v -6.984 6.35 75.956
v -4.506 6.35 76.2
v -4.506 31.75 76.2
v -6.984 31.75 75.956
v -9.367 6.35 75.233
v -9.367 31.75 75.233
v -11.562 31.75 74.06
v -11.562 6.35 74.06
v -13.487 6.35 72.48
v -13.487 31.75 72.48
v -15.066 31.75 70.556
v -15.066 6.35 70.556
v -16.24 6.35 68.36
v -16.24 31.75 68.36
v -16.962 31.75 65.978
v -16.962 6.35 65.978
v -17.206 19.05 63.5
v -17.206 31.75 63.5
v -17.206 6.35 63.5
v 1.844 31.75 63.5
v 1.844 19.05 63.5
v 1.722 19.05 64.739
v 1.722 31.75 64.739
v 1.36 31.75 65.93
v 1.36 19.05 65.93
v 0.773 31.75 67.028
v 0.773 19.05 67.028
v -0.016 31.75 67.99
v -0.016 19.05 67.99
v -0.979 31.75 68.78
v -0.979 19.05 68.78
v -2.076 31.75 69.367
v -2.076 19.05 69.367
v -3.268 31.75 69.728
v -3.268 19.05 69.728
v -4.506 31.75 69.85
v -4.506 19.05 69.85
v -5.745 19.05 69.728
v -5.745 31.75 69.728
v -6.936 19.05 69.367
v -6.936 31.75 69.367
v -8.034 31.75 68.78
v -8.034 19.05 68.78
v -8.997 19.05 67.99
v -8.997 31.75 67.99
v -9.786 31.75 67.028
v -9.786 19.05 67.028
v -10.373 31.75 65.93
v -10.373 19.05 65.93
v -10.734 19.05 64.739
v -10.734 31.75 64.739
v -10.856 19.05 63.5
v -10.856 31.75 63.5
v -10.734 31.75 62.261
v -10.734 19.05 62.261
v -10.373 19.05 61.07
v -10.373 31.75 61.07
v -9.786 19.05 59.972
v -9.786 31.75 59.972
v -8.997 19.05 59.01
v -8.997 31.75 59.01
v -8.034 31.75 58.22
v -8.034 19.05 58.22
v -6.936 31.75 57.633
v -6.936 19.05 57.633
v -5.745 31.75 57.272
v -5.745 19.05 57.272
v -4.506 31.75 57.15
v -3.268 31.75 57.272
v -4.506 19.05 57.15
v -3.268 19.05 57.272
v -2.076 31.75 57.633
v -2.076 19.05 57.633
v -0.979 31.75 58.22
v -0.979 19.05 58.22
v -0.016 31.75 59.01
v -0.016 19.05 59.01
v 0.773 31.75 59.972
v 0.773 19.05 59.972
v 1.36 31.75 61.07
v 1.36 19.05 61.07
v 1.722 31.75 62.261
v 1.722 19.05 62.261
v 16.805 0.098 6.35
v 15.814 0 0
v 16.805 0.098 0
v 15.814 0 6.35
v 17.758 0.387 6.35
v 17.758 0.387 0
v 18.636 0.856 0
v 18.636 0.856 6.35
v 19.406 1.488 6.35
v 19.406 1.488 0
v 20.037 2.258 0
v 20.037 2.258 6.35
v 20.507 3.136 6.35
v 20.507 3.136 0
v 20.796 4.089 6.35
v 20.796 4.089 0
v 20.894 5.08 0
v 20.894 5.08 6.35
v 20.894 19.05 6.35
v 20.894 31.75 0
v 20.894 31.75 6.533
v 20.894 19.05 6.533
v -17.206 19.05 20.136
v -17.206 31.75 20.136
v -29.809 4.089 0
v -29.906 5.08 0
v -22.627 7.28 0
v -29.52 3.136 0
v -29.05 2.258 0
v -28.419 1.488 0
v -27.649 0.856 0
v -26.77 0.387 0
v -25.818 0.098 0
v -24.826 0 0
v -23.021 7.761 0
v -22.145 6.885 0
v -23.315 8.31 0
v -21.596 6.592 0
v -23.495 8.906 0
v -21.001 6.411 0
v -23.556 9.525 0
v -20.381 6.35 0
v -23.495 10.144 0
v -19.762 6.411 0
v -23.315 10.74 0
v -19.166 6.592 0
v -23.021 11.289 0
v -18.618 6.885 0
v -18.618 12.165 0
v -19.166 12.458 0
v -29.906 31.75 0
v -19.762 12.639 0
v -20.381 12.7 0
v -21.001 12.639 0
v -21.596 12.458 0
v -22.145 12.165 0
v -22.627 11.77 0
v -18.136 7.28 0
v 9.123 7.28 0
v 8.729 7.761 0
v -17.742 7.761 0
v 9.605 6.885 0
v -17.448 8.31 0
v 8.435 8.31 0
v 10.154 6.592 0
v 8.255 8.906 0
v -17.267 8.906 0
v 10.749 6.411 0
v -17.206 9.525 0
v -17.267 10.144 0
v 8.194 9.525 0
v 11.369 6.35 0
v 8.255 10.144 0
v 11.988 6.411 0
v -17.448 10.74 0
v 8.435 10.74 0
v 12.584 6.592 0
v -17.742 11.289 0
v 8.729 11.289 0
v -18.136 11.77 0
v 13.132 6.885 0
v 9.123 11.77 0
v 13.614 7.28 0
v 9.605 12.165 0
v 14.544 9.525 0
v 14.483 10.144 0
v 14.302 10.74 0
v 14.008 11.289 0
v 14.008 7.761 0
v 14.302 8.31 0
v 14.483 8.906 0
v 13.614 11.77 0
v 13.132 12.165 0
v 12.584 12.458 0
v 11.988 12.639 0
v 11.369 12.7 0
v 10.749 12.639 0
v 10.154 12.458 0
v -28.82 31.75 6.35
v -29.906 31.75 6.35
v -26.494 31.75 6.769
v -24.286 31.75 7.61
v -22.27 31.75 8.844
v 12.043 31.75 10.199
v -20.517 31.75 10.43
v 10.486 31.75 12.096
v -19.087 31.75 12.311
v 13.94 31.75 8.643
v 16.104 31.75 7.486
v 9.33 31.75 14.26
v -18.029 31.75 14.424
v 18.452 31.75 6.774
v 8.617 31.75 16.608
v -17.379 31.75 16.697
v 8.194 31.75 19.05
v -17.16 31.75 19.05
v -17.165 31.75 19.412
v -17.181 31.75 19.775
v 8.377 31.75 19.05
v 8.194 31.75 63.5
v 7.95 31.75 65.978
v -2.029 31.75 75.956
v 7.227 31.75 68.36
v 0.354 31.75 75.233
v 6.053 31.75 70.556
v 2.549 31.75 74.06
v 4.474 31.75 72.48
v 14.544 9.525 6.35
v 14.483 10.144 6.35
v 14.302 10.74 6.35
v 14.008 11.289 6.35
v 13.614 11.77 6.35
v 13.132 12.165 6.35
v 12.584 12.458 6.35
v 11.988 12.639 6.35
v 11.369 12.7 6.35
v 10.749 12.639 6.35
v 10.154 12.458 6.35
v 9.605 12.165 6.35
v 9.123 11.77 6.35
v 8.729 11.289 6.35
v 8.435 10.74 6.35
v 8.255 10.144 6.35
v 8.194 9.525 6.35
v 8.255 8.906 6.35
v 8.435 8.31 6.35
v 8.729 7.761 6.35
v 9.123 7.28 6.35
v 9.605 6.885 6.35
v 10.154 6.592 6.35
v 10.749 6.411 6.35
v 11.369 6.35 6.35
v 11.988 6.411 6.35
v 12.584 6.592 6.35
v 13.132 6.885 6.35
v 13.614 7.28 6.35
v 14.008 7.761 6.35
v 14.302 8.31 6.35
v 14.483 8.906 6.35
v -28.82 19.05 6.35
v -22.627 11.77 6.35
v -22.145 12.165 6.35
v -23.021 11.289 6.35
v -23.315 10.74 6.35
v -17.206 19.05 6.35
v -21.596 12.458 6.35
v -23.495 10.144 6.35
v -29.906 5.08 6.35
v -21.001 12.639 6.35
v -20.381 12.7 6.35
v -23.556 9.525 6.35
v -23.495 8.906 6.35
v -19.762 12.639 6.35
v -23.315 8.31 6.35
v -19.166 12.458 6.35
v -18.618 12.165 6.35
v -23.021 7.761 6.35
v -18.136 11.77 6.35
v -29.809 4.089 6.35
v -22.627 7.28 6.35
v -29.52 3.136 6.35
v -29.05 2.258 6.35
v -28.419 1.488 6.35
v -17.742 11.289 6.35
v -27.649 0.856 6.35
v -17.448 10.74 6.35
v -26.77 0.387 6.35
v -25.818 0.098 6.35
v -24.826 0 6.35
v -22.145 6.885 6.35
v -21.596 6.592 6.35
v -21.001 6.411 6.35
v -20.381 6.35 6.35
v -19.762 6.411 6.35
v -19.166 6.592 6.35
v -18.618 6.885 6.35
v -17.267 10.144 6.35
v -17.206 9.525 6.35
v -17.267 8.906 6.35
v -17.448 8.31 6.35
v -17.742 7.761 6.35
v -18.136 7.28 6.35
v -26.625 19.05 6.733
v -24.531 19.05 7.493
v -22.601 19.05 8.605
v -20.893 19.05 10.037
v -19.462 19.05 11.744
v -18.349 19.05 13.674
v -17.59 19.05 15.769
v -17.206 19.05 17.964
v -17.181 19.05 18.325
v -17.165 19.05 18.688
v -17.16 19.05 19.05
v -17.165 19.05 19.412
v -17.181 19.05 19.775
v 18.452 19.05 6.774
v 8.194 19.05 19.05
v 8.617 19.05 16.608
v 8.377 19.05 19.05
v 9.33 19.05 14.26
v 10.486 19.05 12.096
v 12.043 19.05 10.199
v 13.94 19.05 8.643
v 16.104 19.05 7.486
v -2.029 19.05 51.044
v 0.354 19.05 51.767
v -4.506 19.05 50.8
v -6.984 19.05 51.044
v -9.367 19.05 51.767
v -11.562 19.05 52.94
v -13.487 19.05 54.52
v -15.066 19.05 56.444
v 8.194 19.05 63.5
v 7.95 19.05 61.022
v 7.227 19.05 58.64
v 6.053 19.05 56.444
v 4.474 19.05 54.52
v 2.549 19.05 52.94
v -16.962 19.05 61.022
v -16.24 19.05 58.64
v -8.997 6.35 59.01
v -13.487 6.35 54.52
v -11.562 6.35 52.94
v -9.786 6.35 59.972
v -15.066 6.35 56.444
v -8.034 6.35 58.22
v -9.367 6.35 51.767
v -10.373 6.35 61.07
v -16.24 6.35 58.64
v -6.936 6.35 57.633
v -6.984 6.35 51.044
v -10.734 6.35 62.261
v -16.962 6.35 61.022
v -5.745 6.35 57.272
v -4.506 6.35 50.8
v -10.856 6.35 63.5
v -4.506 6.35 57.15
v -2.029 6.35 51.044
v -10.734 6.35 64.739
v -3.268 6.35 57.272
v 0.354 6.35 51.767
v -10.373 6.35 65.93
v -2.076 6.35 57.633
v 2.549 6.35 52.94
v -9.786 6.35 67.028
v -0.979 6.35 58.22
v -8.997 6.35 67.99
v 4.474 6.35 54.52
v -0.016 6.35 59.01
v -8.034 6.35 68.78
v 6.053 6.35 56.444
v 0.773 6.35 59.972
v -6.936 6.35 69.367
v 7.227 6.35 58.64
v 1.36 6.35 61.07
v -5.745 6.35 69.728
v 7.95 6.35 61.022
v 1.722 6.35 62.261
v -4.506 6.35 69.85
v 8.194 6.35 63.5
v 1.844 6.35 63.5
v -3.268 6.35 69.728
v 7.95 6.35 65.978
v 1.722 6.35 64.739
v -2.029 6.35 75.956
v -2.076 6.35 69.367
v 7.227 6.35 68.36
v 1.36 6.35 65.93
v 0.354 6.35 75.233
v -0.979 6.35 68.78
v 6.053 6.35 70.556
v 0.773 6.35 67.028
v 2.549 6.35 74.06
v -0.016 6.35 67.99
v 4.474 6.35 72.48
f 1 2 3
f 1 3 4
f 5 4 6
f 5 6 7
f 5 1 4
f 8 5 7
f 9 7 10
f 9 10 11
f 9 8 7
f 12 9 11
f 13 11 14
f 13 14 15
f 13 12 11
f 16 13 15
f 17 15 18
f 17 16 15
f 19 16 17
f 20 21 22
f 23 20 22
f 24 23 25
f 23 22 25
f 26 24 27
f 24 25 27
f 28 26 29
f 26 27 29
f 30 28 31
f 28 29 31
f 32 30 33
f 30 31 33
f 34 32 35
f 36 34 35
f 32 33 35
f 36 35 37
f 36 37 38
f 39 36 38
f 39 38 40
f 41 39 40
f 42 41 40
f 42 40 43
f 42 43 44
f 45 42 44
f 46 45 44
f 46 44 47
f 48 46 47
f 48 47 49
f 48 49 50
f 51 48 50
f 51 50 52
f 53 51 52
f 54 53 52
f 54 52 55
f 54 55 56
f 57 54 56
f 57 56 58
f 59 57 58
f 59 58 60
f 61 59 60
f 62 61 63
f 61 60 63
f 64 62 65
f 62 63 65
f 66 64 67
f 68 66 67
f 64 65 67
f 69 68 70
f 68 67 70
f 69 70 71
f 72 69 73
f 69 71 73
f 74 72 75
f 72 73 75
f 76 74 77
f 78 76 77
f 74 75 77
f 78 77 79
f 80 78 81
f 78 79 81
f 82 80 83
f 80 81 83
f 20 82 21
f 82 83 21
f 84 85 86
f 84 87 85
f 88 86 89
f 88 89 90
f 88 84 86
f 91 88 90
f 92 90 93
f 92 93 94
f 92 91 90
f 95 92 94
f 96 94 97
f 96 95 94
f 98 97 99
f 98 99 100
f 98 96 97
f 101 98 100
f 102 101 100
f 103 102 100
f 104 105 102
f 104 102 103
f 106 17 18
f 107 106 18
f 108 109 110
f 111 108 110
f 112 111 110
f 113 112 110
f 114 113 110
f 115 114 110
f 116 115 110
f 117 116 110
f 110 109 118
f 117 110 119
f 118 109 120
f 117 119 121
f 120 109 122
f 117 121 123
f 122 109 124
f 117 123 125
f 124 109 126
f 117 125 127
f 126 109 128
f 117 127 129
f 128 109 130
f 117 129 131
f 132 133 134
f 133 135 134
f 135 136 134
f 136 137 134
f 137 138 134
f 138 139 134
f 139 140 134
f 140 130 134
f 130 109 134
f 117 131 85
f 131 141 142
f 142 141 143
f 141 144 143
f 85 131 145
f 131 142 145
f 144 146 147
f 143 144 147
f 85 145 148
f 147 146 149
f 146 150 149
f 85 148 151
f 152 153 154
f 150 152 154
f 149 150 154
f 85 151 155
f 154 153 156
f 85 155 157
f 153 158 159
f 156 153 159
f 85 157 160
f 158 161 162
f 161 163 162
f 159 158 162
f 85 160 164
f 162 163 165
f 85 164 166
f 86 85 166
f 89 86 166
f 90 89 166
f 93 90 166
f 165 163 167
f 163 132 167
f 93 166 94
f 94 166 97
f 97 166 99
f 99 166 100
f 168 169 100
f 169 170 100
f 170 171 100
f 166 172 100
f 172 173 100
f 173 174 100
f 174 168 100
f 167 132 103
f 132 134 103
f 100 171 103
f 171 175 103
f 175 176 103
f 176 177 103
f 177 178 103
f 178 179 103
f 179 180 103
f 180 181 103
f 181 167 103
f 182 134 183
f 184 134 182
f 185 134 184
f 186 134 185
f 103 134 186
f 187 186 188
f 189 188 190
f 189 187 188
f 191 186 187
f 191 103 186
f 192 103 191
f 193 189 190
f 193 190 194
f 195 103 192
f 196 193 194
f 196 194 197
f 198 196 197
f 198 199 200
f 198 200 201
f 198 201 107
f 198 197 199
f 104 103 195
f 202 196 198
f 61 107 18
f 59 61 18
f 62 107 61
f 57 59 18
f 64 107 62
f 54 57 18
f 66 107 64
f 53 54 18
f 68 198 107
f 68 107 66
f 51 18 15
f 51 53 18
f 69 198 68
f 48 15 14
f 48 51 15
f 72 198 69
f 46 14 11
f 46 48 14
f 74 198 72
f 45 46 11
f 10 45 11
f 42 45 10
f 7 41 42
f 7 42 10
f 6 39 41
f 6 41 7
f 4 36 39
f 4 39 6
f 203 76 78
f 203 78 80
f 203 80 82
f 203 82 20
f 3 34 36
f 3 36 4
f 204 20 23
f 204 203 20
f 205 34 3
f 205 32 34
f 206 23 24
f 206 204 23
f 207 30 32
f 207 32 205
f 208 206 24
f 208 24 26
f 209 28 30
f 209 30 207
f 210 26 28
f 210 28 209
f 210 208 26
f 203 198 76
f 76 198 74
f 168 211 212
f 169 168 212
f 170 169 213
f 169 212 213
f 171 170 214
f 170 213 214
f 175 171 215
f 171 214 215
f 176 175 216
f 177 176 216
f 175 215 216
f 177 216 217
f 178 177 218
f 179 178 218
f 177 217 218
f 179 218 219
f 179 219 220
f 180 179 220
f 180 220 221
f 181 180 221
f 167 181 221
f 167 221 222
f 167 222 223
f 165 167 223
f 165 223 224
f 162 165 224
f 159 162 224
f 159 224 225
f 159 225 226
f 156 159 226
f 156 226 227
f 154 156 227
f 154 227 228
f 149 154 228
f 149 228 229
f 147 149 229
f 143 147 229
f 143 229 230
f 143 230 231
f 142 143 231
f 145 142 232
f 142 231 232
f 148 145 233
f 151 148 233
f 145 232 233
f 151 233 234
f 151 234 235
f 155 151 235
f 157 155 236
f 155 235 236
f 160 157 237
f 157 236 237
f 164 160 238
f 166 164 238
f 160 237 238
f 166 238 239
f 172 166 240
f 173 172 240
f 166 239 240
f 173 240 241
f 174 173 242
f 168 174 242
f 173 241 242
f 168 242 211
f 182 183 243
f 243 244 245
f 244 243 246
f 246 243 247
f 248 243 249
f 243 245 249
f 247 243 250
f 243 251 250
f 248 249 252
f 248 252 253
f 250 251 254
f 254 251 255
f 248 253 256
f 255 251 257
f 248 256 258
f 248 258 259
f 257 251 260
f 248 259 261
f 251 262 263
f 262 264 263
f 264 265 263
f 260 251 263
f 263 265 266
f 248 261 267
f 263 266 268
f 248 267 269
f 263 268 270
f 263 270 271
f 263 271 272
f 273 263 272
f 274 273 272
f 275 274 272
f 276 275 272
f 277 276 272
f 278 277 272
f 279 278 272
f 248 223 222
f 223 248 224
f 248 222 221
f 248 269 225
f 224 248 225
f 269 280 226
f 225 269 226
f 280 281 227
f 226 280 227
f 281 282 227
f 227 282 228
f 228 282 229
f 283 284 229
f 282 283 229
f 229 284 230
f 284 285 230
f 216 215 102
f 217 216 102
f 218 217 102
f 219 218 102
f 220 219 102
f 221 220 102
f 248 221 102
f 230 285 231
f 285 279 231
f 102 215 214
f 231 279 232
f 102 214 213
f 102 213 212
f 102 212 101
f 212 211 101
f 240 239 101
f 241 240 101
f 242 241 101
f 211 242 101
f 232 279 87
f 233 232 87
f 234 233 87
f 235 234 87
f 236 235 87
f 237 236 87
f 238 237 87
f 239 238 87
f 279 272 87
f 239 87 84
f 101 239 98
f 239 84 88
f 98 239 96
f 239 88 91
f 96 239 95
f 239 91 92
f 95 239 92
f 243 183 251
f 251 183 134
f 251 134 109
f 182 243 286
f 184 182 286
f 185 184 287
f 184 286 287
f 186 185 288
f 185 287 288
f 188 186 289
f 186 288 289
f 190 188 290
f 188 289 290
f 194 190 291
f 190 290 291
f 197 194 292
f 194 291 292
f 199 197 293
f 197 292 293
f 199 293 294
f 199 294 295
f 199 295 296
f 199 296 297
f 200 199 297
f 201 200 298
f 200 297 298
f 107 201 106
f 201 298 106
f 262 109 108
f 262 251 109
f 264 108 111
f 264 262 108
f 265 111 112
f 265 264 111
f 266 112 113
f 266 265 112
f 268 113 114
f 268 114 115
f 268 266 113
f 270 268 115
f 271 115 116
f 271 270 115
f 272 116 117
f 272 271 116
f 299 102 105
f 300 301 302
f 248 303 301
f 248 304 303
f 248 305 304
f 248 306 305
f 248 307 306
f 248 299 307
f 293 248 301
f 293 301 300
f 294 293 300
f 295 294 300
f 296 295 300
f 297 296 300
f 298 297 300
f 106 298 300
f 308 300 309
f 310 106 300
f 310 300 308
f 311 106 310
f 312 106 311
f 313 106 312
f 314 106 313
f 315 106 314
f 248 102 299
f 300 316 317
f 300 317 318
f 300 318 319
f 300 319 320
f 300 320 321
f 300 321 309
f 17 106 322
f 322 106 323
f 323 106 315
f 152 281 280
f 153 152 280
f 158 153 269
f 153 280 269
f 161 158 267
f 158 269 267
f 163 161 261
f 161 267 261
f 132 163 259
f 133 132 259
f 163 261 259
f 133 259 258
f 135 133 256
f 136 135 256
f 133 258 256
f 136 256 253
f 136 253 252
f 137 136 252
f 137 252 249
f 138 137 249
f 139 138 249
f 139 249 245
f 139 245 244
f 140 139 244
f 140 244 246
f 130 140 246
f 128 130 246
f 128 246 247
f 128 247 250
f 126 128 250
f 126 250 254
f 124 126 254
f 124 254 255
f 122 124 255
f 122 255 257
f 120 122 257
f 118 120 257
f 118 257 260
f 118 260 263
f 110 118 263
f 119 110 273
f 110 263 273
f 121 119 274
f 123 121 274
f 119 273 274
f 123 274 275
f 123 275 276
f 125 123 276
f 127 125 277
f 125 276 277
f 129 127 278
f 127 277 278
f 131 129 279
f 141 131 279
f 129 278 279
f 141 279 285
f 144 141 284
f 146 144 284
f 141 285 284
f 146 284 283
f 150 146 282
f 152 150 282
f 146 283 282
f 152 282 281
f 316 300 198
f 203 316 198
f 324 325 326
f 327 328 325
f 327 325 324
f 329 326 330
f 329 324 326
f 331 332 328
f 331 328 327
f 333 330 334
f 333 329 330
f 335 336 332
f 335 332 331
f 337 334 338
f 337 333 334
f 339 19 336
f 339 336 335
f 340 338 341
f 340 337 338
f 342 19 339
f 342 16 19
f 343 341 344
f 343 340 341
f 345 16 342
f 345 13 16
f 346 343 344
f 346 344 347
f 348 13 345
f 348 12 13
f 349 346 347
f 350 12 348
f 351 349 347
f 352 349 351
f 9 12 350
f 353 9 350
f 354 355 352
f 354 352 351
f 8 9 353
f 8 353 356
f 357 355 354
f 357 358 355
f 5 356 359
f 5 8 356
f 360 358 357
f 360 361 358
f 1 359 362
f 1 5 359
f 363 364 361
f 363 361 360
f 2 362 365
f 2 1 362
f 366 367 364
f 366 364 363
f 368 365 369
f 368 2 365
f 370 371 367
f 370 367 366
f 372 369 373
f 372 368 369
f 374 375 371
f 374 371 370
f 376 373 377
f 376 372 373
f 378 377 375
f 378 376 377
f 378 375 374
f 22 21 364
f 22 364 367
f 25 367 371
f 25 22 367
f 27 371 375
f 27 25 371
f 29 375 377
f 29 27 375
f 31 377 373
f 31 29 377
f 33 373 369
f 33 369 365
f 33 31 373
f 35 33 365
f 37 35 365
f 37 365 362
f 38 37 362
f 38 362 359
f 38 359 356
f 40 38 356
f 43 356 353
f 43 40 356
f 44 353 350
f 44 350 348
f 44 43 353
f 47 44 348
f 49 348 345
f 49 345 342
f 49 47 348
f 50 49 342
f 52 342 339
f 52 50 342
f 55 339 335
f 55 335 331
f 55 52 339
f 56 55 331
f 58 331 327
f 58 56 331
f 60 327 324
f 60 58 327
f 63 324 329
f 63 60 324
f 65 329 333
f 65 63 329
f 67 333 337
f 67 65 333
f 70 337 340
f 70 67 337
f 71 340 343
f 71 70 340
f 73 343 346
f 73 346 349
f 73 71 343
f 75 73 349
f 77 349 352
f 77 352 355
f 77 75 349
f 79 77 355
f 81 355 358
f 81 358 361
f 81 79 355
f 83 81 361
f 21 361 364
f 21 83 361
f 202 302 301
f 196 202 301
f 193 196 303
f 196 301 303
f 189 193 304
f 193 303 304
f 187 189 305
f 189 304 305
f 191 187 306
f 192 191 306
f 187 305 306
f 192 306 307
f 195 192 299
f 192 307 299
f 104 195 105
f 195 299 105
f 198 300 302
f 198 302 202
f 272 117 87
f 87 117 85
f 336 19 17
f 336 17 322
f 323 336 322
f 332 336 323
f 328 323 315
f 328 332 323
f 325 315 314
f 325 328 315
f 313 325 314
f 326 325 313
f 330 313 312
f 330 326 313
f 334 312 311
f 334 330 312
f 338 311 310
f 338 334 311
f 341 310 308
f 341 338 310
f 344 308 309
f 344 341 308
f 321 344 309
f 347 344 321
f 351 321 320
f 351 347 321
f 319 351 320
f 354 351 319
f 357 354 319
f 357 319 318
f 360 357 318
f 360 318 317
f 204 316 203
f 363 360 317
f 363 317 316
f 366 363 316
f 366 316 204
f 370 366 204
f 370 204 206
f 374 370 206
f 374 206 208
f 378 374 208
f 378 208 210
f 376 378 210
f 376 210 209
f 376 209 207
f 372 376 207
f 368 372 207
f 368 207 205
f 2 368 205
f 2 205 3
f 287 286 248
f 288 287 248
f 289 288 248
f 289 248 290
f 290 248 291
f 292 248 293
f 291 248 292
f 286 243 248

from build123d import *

# Parameters (mm, degrees)
F0_W      = 50.8
F0_H      = 31.75
F1_DEPTH  = 6.35
F2_R      = 3.175
F3_DEPTH  = 25.4
F4_R      = 5.08
F5_W      = 25.4
F5_H      = 12.7
F6_DEPTH  = 69.85
F7_R      = 6.35
F8_DEPTH  = 12.7
F9_DEPTH  = 25.4
F10_W     = 12.7
F10_H     = 12.7
F11_DEPTH = 12.7
F13_DEPTH = 25.4
F14_W     = 12.7
F14_H     = 12.7
F15_DEPTH = 12.7
F17_DEPTH = 25.4


with BuildPart() as f1:
    # F0 (on Top) → F1 (new body)
    with BuildSketch(Plane.XY):
        with Locations((-4.5064515435, 15.875)):
            Rectangle(F0_W, F0_H)
    extrude(amount=F1_DEPTH)

    # F2 (on face) → F3 (cut)
    with BuildSketch(Plane.XY.offset(6.35)):
        with Locations((11.3685484565, 9.525)):
            Circle(F2_R)
        with Locations((-20.3814515435, 9.525)):
            Circle(F2_R)
    extrude(amount=-F3_DEPTH, mode=Mode.SUBTRACT)

    # F4
    f4_edges = [f1.edges().sort_by_distance(p)[0] for p in [
        (20.893548, 0, 3.175),
        (-29.906452, 0, 3.175),
    ]]
    fillet(f4_edges, radius=F4_R)

    # F5 (on face) → F6 (join)
    with BuildSketch(Plane.XY.offset(6.35)):
        with Locations((-4.5064515435, 25.4)):
            Rectangle(F5_W, F5_H)
    extrude(amount=F6_DEPTH)

    # F7 (on face) → F8 (join)
    with BuildSketch(Plane.XZ.offset(-19.05)):
        with BuildLine():
            ThreePointArc((-17.2064515435, 63.5), (-4.5064515435, 50.8), (8.1935484565, 63.5))
            ThreePointArc((8.1935484565, 63.5), (4.473804616, 72.4802560826), (-4.5064514347, 76.2))
            ThreePointArc((-4.5064514347, 76.2), (-13.4867076261, 72.4802561595), (-17.2064515435, 63.5))
        make_face()
        with Locations((-4.5064515435, 63.5)):
            Circle(F7_R, mode=Mode.SUBTRACT)
    extrude(amount=F8_DEPTH)

    # F9 (cut): faces of the model
    f9_faces = [f1.faces().sort_by_distance(p)[0] for p in [
        (5.3567756319, 19.05, 73.3632271754),
        (-14.3696787189, 19.05, 73.3632271754),
        (-4.5064515435, 19.05, 63.5),
    ]]
    extrude(f9_faces, amount=-F9_DEPTH, mode=Mode.SUBTRACT)

    # F10 (on face) → F11 (join)
    with BuildSketch(Plane.YZ.offset(8.1935484565)):
        with Locations((25.4, 12.7)):
            Rectangle(F10_W, F10_H)
    extrude(amount=F11_DEPTH)

    # F12 (on face) → F13 (cut)
    with BuildSketch(Plane.XZ.offset(-19.05)):
        with BuildLine():
            ThreePointArc((33.4102507488, 19.05), (20.8935484565, 31.5667022923), (8.3768461642, 19.05))
            Line((8.3768461642, 19.05), (20.8935484565, 19.05))
            Line((20.8935484565, 19.05), (20.8935484565, 6.5332977077))
            ThreePointArc((20.8935484565, 6.5332977077), (29.7441935255, 10.199354931), (33.4102507488, 19.05))
        make_face()
        with BuildLine():
            Line((20.8935484565, 19.05), (8.3768461642, 19.05))
            ThreePointArc((8.3768461642, 19.05), (12.0429033875, 10.199354931), (20.8935484565, 6.5332977077))
            Line((20.8935484565, 6.5332977077), (20.8935484565, 19.05))
        make_face()
    extrude(amount=-F13_DEPTH, mode=Mode.SUBTRACT)

    # F14 (on face) → F15 (join)
    with BuildSketch(Plane(origin=(-17.2064515435, 0, 0), x_dir=(0, -1, 0), z_dir=(-1, 0, 0))):
        with Locations((-25.4, 12.7)):
            Rectangle(F14_W, F14_H)
    extrude(amount=F15_DEPTH)

    # F16 (on face) → F17 (cut)
    with BuildSketch(Plane.XZ.offset(-19.05)):
        with BuildLine():
            ThreePointArc((-28.8202851524, 6.35), (-20.5172442286, 10.4295276564), (-17.1600890259, 19.05))
            ThreePointArc((-17.1600890259, 19.05), (-17.17168493, 19.5935777111), (-17.2064515435, 20.1361663911))
            Line((-17.2064515435, 20.1361663911), (-17.2064515435, 19.05))
            Line((-17.2064515435, 19.05), (-29.9064515435, 19.05))
            Line((-29.9064515435, 19.05), (-29.9064515435, 6.35))
            Line((-29.9064515435, 6.35), (-28.8202851524, 6.35))
        make_face()
    extrude(amount=-F17_DEPTH, mode=Mode.SUBTRACT)


solid = f1.part
